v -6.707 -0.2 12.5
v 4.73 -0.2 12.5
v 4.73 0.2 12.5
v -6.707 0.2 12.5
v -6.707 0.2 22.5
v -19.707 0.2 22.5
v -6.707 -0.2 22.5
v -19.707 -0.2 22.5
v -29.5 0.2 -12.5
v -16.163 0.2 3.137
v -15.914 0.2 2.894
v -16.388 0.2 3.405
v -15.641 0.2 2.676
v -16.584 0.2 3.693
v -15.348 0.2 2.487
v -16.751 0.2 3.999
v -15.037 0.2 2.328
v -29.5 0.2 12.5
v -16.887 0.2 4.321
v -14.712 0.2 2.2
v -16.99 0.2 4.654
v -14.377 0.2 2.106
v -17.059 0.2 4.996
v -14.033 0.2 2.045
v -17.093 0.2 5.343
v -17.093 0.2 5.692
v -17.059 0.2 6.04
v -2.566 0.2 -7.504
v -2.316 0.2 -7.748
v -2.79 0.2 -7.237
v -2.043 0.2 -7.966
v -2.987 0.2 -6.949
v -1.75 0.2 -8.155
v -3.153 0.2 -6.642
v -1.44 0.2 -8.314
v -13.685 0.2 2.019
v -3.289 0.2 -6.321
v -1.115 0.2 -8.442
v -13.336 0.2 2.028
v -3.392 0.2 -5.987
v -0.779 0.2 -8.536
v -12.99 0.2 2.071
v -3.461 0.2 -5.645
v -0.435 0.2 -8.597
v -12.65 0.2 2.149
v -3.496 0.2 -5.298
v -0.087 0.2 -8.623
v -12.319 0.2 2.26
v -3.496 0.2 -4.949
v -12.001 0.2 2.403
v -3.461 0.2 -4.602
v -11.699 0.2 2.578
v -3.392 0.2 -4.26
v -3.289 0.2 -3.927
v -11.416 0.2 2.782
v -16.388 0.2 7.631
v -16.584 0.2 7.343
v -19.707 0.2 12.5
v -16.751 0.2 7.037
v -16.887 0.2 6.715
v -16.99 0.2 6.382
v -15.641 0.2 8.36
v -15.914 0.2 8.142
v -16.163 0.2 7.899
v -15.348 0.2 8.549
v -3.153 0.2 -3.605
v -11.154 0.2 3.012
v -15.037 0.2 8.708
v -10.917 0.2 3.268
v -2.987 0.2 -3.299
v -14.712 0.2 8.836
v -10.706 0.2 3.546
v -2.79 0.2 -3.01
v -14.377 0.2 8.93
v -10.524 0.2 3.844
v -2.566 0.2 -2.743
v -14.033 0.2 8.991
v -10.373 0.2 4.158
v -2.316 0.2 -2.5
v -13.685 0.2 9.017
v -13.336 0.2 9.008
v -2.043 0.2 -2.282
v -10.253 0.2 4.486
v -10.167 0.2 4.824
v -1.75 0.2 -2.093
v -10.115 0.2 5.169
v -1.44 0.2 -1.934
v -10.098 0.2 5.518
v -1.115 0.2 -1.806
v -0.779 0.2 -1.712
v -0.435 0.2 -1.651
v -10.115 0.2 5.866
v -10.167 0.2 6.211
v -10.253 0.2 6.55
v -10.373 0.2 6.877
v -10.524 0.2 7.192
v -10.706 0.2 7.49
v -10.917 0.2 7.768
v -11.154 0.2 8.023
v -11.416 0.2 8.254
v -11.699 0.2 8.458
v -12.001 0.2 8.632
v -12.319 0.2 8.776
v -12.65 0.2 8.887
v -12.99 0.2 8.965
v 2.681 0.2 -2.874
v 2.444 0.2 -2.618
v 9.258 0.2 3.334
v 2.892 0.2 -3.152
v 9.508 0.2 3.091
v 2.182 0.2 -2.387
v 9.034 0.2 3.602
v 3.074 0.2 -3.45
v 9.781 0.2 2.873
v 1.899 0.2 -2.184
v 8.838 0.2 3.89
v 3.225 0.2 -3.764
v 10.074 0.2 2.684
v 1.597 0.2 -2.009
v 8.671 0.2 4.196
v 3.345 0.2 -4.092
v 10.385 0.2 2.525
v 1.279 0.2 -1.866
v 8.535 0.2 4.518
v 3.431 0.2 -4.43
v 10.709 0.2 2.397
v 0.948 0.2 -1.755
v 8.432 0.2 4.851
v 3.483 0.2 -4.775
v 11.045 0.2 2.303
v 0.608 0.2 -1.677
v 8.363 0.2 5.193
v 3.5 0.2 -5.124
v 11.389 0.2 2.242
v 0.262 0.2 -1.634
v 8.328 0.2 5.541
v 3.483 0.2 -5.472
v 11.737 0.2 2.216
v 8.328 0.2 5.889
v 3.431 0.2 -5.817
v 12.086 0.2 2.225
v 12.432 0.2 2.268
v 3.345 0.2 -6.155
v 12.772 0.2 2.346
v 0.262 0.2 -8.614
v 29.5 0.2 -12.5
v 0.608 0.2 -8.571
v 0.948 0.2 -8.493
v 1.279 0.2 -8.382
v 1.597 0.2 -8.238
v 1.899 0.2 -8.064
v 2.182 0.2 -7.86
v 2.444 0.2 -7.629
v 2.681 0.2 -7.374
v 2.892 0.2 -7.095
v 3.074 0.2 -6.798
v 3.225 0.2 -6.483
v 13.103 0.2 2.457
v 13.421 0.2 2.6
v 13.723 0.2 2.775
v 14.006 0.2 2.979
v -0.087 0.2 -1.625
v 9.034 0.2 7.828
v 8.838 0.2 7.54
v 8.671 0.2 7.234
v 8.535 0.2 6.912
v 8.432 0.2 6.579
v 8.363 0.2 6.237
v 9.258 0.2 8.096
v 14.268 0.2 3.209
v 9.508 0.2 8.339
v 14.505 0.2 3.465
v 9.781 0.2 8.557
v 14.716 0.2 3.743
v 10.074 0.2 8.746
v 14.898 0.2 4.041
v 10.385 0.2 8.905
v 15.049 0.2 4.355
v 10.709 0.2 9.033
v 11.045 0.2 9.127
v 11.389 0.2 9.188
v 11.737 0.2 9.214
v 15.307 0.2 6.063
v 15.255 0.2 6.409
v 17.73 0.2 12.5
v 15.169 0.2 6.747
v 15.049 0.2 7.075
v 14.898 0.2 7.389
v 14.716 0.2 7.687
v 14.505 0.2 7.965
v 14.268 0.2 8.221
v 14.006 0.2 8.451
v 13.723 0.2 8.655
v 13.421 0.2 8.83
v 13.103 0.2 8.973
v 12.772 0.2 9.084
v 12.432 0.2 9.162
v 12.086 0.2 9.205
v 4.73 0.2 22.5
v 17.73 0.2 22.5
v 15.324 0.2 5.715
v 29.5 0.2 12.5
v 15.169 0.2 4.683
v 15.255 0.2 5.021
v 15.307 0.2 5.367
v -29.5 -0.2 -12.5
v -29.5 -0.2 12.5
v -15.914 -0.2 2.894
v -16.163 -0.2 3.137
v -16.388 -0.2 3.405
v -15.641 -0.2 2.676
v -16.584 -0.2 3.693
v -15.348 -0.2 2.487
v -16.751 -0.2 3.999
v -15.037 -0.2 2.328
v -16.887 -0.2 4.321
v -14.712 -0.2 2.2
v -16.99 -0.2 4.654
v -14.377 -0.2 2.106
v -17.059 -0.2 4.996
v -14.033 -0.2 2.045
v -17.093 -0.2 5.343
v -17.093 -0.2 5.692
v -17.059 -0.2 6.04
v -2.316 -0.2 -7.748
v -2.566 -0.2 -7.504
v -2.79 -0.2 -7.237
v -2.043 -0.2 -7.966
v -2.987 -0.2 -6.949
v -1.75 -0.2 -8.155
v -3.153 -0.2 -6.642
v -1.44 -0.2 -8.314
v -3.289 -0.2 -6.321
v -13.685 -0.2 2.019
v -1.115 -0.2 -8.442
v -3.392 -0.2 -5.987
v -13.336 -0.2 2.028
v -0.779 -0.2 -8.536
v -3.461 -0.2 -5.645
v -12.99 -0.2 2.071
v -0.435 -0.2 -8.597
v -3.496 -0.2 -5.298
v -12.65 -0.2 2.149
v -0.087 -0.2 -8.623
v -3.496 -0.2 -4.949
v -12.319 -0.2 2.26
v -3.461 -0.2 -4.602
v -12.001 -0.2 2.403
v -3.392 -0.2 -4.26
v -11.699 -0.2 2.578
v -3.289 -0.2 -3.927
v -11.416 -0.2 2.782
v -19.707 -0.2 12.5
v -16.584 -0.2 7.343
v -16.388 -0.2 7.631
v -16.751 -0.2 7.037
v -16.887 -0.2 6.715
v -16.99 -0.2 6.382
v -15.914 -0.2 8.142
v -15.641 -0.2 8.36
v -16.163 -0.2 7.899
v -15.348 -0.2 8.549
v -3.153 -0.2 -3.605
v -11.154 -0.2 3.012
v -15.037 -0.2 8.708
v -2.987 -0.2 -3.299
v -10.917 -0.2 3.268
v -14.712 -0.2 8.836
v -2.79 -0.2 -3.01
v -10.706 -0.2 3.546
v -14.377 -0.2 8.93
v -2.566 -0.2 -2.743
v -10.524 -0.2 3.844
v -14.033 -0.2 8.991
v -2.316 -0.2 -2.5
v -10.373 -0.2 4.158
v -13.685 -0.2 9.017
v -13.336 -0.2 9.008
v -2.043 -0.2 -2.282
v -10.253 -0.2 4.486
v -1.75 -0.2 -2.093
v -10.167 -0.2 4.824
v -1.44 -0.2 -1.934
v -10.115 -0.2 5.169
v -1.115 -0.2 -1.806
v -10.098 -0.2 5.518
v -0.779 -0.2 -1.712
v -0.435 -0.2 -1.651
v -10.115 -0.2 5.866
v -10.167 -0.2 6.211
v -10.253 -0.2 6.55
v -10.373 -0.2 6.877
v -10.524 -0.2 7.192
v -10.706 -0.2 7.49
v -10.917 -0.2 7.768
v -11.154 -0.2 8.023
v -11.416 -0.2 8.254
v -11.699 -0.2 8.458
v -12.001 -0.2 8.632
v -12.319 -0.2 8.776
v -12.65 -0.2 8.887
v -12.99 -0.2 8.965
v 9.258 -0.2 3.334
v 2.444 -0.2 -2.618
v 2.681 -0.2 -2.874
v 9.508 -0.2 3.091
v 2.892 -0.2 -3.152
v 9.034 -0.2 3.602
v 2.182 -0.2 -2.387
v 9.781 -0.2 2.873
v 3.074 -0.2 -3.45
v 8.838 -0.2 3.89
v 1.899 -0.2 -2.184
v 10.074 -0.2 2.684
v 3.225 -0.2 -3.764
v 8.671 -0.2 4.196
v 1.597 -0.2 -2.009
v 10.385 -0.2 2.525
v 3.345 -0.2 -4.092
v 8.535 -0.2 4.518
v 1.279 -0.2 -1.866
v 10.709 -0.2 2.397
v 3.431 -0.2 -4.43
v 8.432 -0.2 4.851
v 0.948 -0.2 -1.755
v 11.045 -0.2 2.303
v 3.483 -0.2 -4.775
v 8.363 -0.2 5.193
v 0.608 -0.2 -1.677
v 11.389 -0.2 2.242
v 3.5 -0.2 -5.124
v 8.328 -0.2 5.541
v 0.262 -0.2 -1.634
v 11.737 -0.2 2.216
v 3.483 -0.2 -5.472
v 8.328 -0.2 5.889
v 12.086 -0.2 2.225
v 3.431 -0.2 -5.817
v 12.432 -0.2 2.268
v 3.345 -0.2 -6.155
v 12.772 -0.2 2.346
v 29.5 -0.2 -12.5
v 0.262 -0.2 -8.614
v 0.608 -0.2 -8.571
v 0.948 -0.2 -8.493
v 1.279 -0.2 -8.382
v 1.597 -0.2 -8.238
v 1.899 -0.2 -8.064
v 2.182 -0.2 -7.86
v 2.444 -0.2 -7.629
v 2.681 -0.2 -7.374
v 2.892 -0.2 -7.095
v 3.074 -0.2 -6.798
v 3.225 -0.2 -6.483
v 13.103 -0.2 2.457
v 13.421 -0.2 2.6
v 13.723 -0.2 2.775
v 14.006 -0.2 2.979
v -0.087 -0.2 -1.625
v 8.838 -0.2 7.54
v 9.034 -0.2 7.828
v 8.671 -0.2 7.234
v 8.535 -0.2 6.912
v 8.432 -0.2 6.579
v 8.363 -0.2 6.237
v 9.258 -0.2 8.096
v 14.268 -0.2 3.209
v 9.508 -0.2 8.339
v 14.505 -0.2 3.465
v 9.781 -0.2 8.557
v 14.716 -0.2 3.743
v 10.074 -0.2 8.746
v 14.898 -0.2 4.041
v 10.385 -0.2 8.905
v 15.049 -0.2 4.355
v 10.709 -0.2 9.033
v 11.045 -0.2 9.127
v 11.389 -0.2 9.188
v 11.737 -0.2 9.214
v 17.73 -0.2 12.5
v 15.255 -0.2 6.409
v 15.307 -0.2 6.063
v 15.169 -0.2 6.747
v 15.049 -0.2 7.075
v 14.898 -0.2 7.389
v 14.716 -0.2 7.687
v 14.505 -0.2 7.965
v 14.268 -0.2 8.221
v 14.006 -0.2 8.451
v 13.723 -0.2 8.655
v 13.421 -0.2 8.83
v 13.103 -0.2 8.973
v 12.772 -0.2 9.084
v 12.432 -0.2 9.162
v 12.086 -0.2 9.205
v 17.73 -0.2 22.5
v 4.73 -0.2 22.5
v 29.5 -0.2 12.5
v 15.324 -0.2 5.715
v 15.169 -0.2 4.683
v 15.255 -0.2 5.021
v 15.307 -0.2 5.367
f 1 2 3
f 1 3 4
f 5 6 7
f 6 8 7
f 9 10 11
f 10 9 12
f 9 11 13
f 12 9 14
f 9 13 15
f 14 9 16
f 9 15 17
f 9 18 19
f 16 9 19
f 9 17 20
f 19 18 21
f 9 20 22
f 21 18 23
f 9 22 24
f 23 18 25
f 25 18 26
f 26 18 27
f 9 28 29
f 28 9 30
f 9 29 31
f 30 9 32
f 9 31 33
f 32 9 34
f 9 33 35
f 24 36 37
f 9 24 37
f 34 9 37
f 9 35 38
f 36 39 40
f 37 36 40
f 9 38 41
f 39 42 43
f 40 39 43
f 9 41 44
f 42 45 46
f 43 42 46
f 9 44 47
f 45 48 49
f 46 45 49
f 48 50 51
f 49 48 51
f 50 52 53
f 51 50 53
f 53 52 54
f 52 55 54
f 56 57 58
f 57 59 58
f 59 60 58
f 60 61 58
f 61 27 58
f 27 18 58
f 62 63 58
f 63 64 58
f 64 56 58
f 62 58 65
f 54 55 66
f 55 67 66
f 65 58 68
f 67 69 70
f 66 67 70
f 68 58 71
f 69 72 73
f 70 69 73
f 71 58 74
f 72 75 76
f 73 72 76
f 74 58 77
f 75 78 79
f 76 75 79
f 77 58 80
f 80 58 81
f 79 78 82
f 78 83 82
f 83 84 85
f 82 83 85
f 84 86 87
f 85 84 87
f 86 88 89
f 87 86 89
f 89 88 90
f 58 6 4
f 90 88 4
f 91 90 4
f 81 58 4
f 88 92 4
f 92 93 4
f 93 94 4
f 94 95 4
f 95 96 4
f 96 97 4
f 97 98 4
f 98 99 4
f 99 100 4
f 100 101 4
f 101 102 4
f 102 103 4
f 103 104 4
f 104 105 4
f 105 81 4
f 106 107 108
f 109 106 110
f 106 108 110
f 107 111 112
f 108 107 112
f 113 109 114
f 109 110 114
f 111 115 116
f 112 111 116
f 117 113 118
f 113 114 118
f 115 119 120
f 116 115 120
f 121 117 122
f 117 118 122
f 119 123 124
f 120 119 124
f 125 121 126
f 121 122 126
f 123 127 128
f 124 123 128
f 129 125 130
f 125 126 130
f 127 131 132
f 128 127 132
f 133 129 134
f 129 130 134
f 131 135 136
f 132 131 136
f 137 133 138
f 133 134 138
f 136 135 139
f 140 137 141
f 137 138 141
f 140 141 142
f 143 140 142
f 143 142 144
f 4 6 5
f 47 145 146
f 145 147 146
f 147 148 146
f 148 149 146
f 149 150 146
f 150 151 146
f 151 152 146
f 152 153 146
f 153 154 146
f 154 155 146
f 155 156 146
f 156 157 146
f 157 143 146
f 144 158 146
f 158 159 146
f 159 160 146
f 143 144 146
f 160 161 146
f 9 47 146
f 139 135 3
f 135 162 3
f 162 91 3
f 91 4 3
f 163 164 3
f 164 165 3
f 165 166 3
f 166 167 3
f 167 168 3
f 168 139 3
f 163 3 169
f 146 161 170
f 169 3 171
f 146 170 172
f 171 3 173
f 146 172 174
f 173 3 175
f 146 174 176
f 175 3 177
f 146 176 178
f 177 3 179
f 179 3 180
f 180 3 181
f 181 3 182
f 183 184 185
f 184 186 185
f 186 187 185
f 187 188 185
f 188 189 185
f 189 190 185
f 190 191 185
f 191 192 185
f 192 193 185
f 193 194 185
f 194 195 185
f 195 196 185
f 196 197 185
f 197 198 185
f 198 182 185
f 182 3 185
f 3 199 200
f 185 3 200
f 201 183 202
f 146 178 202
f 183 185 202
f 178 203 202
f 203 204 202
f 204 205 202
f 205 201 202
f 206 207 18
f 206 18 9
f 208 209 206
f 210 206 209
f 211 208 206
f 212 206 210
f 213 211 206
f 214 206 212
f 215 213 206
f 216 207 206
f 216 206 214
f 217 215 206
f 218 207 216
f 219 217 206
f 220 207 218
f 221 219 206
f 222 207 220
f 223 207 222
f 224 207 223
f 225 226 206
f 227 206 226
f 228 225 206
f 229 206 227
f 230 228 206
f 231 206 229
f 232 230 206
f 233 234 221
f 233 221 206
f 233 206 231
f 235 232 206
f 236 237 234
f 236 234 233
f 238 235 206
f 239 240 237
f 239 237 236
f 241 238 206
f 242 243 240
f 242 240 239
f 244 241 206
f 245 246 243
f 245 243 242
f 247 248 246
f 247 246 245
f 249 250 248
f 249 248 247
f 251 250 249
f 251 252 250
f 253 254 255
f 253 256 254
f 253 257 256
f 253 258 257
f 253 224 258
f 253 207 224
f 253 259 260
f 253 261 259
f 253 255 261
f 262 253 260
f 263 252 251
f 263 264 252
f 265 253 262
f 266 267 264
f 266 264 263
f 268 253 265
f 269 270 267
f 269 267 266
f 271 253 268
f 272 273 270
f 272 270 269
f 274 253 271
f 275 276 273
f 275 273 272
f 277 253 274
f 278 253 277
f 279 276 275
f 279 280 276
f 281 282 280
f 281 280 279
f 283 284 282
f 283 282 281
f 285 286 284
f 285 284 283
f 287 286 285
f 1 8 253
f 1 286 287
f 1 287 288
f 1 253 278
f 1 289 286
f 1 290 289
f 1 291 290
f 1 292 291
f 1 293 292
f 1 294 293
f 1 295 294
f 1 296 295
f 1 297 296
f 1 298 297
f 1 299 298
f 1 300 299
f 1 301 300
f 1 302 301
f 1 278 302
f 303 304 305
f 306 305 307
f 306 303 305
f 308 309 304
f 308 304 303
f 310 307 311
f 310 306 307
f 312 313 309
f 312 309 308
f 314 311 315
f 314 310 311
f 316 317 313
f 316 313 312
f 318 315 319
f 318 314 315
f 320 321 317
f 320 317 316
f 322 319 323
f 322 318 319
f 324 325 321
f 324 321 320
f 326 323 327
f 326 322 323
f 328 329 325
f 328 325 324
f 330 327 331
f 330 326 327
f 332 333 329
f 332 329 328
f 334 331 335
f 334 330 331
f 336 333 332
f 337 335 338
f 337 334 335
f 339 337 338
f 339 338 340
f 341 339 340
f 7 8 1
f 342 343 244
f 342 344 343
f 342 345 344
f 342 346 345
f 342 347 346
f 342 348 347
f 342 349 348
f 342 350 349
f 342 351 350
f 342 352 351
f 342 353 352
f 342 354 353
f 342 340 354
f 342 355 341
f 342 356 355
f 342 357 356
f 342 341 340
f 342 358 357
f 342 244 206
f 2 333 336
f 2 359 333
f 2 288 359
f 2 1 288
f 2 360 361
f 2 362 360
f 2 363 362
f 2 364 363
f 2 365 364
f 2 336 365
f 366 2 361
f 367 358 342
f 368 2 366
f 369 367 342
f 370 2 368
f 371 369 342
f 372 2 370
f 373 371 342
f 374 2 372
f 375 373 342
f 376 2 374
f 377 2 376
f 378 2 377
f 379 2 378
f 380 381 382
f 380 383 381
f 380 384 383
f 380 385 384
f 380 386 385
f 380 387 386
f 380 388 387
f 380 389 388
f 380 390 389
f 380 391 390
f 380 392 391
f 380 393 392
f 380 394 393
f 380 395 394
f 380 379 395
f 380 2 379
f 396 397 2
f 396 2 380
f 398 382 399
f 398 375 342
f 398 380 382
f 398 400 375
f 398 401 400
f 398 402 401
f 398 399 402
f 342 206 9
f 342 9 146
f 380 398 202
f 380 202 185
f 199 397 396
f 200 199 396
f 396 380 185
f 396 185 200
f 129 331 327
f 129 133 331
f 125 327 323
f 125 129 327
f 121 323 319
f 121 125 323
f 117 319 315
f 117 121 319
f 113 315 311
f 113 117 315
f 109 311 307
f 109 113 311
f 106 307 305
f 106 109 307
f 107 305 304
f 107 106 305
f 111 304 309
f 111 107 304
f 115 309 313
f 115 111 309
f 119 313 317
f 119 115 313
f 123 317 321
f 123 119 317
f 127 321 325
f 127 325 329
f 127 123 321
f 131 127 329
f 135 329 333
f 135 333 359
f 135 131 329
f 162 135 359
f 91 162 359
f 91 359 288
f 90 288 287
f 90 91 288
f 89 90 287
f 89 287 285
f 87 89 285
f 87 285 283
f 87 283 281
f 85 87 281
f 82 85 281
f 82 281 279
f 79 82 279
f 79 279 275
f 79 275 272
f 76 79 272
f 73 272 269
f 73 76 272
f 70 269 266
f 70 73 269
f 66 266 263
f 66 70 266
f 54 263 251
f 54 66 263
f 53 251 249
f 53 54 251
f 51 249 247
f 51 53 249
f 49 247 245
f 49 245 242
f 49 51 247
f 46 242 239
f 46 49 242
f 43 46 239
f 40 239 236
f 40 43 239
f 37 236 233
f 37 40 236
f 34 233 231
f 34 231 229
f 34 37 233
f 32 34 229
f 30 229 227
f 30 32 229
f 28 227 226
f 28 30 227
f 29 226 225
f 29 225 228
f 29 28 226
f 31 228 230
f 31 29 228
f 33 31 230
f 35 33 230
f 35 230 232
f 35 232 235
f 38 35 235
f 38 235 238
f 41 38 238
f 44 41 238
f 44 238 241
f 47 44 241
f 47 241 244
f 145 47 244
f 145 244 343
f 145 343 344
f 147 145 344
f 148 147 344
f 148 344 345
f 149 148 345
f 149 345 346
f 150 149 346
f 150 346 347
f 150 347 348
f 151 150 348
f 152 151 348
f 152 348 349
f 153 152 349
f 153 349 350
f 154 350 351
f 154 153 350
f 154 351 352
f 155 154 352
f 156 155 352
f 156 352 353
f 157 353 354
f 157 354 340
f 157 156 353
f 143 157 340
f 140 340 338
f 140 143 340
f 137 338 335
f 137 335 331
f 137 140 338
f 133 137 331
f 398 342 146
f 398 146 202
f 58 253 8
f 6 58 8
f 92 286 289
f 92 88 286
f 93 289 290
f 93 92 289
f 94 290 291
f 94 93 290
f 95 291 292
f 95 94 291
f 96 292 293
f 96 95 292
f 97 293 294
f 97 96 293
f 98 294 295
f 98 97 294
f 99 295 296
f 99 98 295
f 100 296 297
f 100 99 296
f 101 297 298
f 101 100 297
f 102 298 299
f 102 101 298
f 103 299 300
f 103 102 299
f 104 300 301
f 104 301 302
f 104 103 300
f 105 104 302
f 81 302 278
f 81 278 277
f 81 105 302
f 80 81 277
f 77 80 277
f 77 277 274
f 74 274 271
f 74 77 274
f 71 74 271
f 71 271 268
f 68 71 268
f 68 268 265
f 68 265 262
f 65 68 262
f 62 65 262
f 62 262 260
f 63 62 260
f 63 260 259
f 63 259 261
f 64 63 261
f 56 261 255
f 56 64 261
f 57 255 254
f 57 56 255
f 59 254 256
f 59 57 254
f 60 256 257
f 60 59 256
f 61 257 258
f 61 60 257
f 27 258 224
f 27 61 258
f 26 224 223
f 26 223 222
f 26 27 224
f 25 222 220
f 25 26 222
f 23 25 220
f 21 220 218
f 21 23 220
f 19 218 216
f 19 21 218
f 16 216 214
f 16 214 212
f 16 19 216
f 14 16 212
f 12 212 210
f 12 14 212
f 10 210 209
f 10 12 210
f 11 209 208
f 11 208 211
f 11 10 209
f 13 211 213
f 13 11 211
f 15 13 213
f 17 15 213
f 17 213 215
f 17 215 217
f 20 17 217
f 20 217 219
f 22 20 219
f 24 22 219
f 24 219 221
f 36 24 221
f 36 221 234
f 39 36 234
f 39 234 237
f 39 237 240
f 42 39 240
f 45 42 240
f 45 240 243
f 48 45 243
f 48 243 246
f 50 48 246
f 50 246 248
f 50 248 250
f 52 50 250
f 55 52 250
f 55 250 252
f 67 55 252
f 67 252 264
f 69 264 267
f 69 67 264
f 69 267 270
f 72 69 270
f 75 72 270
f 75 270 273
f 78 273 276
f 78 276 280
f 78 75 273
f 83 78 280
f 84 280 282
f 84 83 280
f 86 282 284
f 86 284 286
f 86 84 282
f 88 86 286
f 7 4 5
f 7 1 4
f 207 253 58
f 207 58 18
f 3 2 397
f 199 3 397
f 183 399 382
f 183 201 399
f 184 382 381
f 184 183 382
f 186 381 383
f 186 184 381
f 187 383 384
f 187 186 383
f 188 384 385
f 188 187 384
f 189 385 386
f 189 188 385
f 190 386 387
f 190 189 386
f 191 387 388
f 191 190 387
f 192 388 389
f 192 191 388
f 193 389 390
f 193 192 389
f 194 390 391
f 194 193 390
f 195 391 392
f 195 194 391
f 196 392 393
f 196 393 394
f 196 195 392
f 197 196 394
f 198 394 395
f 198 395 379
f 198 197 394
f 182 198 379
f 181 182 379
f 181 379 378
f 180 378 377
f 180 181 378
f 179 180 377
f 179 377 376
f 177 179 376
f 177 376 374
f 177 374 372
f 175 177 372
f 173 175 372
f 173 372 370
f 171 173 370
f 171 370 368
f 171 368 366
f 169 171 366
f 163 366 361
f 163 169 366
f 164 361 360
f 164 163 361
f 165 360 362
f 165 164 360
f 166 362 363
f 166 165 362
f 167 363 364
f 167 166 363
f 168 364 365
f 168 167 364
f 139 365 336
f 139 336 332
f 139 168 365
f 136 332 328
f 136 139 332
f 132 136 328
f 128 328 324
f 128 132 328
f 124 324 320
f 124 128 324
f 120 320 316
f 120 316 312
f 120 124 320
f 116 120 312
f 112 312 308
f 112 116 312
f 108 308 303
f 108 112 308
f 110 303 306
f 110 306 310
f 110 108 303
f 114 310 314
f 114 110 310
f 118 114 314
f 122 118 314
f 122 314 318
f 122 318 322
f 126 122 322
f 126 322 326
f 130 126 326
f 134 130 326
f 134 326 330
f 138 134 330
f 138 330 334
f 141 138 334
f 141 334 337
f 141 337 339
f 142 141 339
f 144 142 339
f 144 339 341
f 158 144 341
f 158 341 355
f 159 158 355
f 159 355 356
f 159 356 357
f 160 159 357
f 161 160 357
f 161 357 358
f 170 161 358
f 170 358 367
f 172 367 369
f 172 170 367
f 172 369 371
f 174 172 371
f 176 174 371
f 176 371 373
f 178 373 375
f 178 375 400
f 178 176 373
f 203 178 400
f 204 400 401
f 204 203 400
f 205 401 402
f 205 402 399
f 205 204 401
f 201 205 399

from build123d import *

# Parameters (mm, degrees)
F0_W     = 13
F0_H     = 10
F0_R     = 3.5
F1_DEPTH = 0.2


with BuildPart() as f1:
    # F0 (on Front) → F1 (new body, symmetric)
    with BuildSketch(Plane.XZ):
        with Locations((-13.206897, 17.5)):
            Rectangle(F0_W, F0_H)
        Polygon((-19.706897, 12.5), (-29.5, 12.5), (-29.5, -12.5), (29.5, -12.5), (29.5, 12.5), (17.729655, 12.5), (4.729655, 12.5), (-6.706897, 12.5), align=None)
        with Locations((0, -5.123793)):
            Circle(F0_R, mode=Mode.SUBTRACT)
        with Locations((-13.597759, 5.517931)):
            Circle(F0_R, mode=Mode.SUBTRACT)
        with Locations((11.824138, 5.715)):
            Circle(F0_R, mode=Mode.SUBTRACT)
        with Locations((11.229655, 17.5)):
            Rectangle(F0_W, F0_H)
    extrude(amount=F1_DEPTH, both=True)


solid = f1.part
